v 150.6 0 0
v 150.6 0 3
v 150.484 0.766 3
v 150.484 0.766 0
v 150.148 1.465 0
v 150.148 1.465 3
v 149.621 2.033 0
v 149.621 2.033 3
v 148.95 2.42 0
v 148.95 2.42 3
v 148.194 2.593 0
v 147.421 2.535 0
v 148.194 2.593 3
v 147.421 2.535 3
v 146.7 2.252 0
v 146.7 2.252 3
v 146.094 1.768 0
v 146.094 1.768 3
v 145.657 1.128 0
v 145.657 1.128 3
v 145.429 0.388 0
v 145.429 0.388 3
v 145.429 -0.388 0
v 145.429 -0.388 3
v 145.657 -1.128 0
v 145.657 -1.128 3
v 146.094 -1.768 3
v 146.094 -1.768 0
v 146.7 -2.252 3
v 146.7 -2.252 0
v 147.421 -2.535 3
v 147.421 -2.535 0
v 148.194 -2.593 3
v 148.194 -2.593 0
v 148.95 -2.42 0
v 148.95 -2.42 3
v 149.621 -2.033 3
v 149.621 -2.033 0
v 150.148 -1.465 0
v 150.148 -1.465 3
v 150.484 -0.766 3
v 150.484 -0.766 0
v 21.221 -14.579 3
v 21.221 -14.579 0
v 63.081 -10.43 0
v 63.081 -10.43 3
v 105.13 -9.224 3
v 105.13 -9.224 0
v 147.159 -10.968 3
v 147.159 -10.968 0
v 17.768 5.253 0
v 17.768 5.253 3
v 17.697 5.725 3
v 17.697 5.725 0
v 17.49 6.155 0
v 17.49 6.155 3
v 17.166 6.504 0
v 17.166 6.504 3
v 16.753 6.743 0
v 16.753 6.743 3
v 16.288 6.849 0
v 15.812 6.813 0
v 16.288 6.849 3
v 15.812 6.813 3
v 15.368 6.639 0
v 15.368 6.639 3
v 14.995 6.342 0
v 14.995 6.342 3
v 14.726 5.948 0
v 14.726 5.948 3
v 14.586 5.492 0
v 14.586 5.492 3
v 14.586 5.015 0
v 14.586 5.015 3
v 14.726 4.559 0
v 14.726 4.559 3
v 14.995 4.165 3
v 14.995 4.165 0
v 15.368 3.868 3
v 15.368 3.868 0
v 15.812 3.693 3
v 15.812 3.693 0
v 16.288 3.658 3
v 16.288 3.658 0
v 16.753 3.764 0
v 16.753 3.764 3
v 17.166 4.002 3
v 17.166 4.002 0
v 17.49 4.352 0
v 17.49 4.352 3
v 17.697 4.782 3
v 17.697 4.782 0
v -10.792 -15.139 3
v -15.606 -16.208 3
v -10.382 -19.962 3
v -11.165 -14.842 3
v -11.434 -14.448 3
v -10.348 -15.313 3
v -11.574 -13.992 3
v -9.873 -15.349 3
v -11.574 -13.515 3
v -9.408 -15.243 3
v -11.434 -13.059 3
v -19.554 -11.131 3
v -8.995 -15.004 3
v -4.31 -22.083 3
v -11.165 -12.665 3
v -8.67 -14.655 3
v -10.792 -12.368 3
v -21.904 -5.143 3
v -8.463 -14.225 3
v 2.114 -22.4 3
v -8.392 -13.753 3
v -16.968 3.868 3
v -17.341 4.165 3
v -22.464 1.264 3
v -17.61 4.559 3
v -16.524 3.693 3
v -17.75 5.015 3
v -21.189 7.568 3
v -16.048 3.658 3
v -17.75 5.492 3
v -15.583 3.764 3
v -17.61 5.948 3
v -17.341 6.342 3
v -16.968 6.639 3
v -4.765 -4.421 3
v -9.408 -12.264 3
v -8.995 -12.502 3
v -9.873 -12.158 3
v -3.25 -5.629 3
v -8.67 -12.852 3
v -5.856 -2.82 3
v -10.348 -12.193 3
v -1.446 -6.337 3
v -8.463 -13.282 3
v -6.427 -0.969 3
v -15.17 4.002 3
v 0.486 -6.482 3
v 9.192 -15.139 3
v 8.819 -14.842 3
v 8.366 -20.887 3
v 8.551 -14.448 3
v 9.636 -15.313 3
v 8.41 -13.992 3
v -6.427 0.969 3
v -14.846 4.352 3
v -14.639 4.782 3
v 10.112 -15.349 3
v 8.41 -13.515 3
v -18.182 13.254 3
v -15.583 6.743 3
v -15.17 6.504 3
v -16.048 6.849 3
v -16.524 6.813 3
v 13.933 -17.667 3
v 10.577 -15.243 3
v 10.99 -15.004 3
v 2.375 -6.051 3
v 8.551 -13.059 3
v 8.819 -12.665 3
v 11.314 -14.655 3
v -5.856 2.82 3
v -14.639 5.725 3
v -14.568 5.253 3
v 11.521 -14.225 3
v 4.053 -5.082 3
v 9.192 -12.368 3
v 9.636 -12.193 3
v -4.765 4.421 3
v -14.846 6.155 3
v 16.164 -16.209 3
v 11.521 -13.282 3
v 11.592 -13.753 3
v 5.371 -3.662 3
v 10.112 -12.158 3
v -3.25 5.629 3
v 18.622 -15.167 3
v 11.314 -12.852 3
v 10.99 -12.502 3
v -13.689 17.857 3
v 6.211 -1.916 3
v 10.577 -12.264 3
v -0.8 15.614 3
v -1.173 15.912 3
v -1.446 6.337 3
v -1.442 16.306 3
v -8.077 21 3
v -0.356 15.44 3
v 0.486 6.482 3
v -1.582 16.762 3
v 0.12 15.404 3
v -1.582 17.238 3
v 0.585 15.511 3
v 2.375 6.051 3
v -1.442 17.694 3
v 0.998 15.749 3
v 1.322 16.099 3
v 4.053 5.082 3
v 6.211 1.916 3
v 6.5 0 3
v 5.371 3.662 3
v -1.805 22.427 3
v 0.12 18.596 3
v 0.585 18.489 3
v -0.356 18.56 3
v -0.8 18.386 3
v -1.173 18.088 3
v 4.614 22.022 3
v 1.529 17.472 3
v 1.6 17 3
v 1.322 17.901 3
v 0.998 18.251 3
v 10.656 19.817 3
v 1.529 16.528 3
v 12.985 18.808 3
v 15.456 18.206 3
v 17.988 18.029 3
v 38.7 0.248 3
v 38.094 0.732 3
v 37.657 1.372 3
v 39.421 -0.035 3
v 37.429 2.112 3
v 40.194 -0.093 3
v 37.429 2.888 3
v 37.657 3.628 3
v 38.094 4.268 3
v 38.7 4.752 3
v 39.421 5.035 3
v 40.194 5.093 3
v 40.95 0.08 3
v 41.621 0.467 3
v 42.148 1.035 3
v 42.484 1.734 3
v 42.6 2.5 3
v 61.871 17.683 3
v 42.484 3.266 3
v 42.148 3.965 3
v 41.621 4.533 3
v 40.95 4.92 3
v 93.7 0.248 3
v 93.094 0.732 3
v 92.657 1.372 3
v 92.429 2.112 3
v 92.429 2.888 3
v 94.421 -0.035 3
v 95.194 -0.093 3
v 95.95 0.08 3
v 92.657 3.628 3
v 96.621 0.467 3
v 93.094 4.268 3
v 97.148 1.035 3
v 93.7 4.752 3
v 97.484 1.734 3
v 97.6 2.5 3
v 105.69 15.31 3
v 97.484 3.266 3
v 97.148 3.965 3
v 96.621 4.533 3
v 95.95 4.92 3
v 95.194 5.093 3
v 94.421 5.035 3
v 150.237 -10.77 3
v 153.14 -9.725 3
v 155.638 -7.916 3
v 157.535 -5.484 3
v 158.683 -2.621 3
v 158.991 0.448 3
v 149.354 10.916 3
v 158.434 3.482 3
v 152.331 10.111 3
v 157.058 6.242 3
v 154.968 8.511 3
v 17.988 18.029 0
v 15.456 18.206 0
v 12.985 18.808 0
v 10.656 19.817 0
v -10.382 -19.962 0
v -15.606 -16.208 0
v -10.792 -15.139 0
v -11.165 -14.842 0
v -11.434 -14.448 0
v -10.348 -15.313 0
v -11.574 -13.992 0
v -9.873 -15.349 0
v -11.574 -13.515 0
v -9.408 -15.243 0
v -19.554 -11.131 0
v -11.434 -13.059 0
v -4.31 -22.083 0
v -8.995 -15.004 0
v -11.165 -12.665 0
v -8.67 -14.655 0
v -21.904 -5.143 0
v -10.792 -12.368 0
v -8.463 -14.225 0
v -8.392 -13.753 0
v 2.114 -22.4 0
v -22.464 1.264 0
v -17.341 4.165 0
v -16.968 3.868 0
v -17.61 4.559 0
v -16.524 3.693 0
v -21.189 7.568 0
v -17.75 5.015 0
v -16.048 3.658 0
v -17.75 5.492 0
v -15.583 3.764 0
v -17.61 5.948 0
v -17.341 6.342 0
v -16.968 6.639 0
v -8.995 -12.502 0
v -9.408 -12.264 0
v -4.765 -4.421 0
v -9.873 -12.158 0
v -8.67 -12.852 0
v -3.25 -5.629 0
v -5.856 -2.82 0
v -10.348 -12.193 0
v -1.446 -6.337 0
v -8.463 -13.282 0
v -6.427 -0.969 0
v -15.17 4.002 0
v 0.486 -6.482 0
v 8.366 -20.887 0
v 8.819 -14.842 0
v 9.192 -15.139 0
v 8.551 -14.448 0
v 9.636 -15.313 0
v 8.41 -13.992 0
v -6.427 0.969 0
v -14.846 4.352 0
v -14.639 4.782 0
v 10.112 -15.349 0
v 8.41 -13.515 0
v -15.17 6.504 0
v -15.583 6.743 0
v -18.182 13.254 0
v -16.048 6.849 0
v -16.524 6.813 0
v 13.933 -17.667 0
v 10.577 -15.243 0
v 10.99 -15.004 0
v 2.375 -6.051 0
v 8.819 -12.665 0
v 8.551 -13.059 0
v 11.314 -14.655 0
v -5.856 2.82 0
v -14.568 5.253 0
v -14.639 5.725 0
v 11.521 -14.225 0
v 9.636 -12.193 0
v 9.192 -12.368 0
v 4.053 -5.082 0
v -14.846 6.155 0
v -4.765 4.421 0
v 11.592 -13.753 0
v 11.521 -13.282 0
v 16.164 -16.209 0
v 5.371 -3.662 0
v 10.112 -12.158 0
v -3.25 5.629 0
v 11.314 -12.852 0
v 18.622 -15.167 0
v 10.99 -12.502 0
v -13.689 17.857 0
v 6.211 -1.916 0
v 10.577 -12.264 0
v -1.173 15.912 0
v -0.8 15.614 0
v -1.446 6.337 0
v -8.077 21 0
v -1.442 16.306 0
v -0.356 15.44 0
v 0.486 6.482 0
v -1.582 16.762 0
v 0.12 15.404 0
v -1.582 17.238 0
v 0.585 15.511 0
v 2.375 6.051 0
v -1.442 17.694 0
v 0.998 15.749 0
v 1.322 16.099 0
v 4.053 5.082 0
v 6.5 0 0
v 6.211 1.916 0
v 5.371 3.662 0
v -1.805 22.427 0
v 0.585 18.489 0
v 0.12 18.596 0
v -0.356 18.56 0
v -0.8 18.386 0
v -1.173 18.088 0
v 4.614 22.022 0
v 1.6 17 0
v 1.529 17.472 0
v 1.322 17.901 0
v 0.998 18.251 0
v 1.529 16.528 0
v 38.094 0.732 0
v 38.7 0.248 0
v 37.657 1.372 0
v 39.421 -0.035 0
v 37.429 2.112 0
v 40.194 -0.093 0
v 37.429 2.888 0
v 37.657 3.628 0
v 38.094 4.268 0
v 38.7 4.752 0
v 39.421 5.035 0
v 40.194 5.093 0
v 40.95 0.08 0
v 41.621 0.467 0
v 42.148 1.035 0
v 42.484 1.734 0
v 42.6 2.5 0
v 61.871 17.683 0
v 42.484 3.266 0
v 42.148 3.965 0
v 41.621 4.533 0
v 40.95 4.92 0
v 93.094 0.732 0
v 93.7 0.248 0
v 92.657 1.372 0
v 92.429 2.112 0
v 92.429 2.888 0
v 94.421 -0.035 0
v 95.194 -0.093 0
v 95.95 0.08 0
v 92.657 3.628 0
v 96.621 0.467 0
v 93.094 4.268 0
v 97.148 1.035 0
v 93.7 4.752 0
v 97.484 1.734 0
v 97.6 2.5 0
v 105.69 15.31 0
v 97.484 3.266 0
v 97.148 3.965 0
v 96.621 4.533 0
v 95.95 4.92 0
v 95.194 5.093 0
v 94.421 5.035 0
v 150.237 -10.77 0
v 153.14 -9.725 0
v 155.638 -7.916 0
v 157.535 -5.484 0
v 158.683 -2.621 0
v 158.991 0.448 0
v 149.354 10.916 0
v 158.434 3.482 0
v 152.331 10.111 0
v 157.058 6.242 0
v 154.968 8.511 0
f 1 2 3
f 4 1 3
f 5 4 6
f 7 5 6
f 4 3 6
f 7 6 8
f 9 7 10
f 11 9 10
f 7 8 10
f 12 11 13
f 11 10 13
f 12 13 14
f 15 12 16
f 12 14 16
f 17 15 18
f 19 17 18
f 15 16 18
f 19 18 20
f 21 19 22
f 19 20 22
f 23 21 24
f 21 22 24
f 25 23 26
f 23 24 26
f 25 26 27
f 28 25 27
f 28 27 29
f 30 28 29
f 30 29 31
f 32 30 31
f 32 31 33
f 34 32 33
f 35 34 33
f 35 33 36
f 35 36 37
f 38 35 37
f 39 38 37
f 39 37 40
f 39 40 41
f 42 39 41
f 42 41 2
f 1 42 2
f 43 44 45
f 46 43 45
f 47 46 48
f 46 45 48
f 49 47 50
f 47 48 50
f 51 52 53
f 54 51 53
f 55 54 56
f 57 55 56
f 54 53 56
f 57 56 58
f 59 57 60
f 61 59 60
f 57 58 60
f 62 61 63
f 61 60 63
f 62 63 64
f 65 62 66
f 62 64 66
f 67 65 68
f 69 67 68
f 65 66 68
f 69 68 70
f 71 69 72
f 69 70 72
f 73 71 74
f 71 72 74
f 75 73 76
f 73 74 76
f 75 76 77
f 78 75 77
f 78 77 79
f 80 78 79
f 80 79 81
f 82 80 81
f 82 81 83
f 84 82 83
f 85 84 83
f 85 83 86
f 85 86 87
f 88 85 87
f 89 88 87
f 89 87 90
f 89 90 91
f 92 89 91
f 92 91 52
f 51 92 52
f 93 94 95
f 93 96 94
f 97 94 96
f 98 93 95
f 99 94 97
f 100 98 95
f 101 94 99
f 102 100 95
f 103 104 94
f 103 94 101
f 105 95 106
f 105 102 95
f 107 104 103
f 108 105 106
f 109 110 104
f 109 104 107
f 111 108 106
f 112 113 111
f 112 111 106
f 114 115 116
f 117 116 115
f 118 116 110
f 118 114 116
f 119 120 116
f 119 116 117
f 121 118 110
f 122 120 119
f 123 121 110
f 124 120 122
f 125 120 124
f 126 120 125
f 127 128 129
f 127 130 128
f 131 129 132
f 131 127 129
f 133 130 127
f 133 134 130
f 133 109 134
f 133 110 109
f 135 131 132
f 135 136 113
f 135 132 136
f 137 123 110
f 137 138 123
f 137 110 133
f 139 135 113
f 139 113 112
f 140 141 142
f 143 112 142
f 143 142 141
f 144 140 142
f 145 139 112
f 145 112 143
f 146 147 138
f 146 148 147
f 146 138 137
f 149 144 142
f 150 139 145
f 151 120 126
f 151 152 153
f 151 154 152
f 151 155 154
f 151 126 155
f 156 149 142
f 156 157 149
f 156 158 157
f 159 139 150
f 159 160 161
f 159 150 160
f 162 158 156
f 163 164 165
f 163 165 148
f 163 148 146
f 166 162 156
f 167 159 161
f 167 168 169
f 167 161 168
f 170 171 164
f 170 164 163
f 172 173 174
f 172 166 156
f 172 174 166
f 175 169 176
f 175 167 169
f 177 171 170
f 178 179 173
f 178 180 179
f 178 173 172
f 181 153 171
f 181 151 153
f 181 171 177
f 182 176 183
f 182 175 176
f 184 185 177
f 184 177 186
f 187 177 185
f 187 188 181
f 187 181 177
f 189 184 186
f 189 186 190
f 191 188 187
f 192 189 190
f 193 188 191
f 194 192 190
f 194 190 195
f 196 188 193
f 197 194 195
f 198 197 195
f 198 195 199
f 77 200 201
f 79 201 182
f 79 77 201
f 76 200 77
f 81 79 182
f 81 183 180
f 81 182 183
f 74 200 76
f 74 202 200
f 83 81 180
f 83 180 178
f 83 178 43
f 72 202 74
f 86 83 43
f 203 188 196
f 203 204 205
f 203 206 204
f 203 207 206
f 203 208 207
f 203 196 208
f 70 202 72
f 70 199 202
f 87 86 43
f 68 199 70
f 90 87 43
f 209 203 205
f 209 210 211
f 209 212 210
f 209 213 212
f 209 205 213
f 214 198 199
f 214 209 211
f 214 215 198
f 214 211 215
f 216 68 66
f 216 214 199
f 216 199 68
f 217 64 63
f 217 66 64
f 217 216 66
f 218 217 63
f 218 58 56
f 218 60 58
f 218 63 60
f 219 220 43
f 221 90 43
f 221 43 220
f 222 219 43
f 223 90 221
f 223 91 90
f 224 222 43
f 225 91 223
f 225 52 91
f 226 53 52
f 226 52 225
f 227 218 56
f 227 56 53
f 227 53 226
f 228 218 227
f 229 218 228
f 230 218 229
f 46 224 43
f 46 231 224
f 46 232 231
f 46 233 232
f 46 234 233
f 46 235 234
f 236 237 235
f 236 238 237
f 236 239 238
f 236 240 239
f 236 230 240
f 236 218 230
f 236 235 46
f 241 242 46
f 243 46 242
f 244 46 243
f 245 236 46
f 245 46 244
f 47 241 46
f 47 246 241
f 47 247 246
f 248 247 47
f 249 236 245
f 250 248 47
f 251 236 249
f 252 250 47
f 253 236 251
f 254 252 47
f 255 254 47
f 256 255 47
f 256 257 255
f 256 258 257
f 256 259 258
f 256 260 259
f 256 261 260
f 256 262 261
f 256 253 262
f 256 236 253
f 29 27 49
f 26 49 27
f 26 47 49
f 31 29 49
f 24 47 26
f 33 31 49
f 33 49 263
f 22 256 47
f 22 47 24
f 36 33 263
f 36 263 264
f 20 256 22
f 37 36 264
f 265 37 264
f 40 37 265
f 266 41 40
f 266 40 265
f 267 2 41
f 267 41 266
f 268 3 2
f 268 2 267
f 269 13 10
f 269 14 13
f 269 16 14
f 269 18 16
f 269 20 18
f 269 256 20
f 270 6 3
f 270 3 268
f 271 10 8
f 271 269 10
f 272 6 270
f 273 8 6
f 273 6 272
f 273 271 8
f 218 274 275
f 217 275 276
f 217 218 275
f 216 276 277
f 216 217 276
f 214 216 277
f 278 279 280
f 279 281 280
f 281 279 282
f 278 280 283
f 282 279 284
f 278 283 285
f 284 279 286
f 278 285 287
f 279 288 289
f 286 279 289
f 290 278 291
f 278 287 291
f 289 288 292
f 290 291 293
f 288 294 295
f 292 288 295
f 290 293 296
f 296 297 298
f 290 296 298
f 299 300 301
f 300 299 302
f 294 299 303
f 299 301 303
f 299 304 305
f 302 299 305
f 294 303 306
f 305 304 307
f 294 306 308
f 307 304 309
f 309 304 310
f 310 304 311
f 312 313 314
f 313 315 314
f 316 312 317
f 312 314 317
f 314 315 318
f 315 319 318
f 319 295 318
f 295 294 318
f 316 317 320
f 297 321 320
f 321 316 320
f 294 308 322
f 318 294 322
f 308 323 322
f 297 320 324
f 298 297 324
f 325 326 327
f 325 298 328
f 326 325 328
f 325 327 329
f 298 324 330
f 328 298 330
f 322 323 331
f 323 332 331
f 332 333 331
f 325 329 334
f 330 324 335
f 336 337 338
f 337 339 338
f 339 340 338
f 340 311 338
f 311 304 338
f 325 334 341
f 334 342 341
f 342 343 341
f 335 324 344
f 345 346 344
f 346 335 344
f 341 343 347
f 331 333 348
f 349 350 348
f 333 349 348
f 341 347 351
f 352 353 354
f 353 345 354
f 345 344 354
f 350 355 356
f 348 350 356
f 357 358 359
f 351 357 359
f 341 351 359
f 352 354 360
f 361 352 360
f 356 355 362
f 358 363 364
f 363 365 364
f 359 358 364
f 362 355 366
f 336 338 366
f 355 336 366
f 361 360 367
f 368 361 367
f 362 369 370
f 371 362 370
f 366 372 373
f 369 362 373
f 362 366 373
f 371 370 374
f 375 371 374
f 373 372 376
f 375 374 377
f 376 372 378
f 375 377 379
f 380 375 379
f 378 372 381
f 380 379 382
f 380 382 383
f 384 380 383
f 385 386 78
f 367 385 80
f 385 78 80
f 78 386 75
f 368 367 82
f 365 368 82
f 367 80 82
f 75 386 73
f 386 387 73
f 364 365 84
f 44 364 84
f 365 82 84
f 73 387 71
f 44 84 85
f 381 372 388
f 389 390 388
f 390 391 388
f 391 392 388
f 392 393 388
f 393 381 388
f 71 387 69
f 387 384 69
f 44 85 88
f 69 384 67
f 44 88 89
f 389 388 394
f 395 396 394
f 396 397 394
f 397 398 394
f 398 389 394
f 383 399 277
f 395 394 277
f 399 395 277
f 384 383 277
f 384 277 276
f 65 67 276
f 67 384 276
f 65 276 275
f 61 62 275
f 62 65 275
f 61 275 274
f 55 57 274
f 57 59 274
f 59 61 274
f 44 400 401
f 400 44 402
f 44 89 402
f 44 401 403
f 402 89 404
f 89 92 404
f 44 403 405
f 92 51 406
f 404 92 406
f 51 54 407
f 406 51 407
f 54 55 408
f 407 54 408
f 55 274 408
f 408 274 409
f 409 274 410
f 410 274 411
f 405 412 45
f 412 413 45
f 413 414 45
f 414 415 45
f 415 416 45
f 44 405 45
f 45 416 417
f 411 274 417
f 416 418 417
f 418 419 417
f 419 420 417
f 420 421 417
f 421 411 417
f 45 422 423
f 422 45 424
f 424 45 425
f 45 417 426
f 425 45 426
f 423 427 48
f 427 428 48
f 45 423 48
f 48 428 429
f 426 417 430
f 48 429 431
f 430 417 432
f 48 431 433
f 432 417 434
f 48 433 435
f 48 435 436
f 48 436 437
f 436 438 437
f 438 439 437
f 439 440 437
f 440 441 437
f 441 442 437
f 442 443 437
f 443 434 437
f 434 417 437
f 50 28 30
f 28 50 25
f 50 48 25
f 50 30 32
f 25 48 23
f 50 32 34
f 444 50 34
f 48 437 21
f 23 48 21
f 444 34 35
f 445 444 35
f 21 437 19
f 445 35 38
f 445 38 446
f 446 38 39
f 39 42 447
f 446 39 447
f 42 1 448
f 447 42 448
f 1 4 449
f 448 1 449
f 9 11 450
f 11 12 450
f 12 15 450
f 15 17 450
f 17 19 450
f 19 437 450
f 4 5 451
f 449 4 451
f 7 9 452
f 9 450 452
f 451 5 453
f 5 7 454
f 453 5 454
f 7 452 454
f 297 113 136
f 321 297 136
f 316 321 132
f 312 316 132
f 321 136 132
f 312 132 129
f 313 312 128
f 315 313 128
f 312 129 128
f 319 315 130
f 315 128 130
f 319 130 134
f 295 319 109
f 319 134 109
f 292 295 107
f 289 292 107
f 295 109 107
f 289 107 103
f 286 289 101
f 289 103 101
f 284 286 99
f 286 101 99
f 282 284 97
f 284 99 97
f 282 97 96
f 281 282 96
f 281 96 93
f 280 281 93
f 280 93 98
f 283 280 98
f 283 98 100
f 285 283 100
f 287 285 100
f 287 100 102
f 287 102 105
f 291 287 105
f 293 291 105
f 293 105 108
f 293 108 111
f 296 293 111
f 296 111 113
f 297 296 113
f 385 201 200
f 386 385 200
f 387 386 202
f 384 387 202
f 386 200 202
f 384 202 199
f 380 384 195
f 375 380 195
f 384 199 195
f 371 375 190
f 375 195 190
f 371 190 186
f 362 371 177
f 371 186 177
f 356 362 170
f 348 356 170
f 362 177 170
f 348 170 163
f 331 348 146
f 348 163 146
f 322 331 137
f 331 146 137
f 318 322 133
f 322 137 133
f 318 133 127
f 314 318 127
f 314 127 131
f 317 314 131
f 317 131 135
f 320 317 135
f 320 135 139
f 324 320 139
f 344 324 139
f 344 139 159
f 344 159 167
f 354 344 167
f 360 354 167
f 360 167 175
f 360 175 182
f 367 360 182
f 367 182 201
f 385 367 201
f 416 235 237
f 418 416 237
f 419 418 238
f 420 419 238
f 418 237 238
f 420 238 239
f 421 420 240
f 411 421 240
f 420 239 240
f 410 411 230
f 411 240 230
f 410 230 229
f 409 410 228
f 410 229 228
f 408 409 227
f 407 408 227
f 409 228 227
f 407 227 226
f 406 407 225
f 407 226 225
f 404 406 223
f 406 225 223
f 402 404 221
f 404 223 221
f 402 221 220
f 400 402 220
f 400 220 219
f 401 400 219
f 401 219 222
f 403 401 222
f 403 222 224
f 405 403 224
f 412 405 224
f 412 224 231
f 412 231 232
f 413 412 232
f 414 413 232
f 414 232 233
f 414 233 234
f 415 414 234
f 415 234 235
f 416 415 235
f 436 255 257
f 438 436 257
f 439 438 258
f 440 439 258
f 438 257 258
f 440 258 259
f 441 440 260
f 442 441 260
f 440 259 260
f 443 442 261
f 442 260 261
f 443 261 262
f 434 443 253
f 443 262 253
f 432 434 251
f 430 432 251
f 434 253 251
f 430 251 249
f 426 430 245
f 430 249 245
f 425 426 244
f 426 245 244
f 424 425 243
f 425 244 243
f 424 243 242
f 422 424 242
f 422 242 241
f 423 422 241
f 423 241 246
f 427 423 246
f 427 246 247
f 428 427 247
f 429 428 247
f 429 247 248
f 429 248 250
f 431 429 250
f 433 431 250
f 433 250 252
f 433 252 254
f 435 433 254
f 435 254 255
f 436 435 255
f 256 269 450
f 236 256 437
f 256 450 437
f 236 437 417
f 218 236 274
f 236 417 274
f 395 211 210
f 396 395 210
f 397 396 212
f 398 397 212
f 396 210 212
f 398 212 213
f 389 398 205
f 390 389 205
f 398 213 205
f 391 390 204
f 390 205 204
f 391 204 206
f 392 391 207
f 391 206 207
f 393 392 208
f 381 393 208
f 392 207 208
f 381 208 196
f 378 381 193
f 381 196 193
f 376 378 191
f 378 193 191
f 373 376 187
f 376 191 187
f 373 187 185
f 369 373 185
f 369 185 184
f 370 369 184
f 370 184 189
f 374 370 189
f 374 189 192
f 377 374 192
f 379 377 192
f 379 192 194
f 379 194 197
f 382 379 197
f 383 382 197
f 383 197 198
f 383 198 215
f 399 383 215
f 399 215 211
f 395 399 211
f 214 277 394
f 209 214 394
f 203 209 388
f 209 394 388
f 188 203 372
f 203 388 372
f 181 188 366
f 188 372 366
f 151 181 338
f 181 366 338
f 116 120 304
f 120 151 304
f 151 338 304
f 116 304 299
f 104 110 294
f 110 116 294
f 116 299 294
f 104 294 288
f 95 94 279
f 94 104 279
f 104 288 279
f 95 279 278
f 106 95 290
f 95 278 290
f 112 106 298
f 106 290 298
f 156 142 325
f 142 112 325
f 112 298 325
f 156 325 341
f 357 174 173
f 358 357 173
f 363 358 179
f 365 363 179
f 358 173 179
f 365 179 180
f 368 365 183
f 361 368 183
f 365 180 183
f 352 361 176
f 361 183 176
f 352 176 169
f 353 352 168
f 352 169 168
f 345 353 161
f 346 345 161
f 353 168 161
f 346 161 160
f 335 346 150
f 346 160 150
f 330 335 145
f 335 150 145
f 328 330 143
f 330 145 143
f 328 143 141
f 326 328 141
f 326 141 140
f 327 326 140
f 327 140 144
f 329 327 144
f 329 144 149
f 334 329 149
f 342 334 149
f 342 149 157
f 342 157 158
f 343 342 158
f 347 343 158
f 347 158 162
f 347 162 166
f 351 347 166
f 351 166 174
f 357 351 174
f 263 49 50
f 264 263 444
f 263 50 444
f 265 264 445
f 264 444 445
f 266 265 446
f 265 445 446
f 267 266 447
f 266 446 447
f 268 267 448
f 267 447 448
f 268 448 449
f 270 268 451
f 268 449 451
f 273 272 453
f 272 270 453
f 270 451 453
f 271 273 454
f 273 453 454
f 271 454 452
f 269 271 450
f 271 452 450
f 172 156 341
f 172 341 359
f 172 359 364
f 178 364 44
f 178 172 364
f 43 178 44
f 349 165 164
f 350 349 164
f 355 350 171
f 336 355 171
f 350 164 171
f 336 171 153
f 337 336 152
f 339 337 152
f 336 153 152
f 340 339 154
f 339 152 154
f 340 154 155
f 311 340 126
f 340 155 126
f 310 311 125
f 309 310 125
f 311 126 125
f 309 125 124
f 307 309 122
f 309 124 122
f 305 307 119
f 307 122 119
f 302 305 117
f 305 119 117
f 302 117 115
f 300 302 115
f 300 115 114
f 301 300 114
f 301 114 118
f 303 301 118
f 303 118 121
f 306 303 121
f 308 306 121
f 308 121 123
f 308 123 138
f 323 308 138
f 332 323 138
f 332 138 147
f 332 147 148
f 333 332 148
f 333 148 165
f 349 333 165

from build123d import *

# Parameters (mm, degrees)
BOSS_EXTRUDE1_START     = -5
BOSS_EXTRUDE1_OUTLINE_R = 1.925
BOSS_EXTRUDE1_DEPTH     = 5
SKETCH4_R               = 1.6
CUT_EXTRUDE2_DEPTH      = 161.661912101
FILLET1_R               = 15
SKETCH5_R               = 6.5
SKETCH5_R_2             = 2.6
CUT_EXTRUDE4_DEPTH      = 161.661912218
SKETCH6_W               = 233.09675901
SKETCH6_H               = 87.107773224
CUT_EXTRUDE5_DEPTH      = 2


with BuildPart() as part:
    # Boss-Extrude1: read off the stored shape, not the designer's step
    # Boss-Extrude1 outline → Boss-Extrude1 (new body)
    with BuildSketch(Plane.XY.offset(5).offset(BOSS_EXTRUDE1_START)):
        with BuildLine():
            ThreePointArc((149.353851183, 10.916367847), (81.584978704, 16.866619507), (13.564040933, 17.951790818))
            ThreePointArc((13.564040933, 17.951790818), (-22.408339146, -2.028875729), (16.567779435, -15.223622585))
            ThreePointArc((16.567779435, -15.223622585), (81.747231754, -9.530296146), (147.159069574, -10.96780908))
            ThreePointArc((147.159069574, -10.96780908), (158.945093507, -1.097692183), (149.353851183, 10.916367847))
        make_face()
        with Locations((40, 2.5)):
            Circle(BOSS_EXTRUDE1_OUTLINE_R, mode=Mode.SUBTRACT)
        with Locations((95, 2.5)):
            Circle(BOSS_EXTRUDE1_OUTLINE_R, mode=Mode.SUBTRACT)
    extrude(amount=BOSS_EXTRUDE1_DEPTH)

    # Sketch4 → Cut-Extrude2 (cut, through all)
    with BuildSketch(Plane.XY.offset(5)):
        with Locations((0, 17)):
            Circle(SKETCH4_R)
        with Locations((16.167960777, 5.253288904)):
            Circle(SKETCH4_R)
        with Locations((9.992349289, -13.753288904)):
            Circle(SKETCH4_R)
        with Locations((-9.992349289, -13.753288904)):
            Circle(SKETCH4_R)
        with Locations((-16.167960777, 5.253288904)):
            Circle(SKETCH4_R)
    extrude(amount=-CUT_EXTRUDE2_DEPTH, mode=Mode.SUBTRACT)

    # Fillet1
    fillet1_edges = [part.edges().sort_by_distance(p)[0] for p in [
        (16.567779435, -15.223622585, 2.5),
        (13.564040933, 17.951790818, 2.5),
    ]]
    fillet(fillet1_edges, radius=FILLET1_R)

    # Sketch5 → Cut-Extrude4 (cut, through all)
    with BuildSketch(Plane.XY.offset(5)):
        Circle(SKETCH5_R)
        with Locations((148, 0)):
            Circle(SKETCH5_R_2)
        with Locations((95, 2.5)):
            Circle(SKETCH5_R_2)
        with Locations((40, 2.5)):
            Circle(SKETCH5_R_2)
    extrude(amount=-CUT_EXTRUDE4_DEPTH, mode=Mode.SUBTRACT)

    # Sketch6 → Cut-Extrude5 (cut)
    with BuildSketch(Plane.XY.offset(5)):
        with Locations((68.481602645, 0)):
            Rectangle(SKETCH6_W, SKETCH6_H)
    extrude(amount=-CUT_EXTRUDE5_DEPTH, mode=Mode.SUBTRACT)


solid = part.part
